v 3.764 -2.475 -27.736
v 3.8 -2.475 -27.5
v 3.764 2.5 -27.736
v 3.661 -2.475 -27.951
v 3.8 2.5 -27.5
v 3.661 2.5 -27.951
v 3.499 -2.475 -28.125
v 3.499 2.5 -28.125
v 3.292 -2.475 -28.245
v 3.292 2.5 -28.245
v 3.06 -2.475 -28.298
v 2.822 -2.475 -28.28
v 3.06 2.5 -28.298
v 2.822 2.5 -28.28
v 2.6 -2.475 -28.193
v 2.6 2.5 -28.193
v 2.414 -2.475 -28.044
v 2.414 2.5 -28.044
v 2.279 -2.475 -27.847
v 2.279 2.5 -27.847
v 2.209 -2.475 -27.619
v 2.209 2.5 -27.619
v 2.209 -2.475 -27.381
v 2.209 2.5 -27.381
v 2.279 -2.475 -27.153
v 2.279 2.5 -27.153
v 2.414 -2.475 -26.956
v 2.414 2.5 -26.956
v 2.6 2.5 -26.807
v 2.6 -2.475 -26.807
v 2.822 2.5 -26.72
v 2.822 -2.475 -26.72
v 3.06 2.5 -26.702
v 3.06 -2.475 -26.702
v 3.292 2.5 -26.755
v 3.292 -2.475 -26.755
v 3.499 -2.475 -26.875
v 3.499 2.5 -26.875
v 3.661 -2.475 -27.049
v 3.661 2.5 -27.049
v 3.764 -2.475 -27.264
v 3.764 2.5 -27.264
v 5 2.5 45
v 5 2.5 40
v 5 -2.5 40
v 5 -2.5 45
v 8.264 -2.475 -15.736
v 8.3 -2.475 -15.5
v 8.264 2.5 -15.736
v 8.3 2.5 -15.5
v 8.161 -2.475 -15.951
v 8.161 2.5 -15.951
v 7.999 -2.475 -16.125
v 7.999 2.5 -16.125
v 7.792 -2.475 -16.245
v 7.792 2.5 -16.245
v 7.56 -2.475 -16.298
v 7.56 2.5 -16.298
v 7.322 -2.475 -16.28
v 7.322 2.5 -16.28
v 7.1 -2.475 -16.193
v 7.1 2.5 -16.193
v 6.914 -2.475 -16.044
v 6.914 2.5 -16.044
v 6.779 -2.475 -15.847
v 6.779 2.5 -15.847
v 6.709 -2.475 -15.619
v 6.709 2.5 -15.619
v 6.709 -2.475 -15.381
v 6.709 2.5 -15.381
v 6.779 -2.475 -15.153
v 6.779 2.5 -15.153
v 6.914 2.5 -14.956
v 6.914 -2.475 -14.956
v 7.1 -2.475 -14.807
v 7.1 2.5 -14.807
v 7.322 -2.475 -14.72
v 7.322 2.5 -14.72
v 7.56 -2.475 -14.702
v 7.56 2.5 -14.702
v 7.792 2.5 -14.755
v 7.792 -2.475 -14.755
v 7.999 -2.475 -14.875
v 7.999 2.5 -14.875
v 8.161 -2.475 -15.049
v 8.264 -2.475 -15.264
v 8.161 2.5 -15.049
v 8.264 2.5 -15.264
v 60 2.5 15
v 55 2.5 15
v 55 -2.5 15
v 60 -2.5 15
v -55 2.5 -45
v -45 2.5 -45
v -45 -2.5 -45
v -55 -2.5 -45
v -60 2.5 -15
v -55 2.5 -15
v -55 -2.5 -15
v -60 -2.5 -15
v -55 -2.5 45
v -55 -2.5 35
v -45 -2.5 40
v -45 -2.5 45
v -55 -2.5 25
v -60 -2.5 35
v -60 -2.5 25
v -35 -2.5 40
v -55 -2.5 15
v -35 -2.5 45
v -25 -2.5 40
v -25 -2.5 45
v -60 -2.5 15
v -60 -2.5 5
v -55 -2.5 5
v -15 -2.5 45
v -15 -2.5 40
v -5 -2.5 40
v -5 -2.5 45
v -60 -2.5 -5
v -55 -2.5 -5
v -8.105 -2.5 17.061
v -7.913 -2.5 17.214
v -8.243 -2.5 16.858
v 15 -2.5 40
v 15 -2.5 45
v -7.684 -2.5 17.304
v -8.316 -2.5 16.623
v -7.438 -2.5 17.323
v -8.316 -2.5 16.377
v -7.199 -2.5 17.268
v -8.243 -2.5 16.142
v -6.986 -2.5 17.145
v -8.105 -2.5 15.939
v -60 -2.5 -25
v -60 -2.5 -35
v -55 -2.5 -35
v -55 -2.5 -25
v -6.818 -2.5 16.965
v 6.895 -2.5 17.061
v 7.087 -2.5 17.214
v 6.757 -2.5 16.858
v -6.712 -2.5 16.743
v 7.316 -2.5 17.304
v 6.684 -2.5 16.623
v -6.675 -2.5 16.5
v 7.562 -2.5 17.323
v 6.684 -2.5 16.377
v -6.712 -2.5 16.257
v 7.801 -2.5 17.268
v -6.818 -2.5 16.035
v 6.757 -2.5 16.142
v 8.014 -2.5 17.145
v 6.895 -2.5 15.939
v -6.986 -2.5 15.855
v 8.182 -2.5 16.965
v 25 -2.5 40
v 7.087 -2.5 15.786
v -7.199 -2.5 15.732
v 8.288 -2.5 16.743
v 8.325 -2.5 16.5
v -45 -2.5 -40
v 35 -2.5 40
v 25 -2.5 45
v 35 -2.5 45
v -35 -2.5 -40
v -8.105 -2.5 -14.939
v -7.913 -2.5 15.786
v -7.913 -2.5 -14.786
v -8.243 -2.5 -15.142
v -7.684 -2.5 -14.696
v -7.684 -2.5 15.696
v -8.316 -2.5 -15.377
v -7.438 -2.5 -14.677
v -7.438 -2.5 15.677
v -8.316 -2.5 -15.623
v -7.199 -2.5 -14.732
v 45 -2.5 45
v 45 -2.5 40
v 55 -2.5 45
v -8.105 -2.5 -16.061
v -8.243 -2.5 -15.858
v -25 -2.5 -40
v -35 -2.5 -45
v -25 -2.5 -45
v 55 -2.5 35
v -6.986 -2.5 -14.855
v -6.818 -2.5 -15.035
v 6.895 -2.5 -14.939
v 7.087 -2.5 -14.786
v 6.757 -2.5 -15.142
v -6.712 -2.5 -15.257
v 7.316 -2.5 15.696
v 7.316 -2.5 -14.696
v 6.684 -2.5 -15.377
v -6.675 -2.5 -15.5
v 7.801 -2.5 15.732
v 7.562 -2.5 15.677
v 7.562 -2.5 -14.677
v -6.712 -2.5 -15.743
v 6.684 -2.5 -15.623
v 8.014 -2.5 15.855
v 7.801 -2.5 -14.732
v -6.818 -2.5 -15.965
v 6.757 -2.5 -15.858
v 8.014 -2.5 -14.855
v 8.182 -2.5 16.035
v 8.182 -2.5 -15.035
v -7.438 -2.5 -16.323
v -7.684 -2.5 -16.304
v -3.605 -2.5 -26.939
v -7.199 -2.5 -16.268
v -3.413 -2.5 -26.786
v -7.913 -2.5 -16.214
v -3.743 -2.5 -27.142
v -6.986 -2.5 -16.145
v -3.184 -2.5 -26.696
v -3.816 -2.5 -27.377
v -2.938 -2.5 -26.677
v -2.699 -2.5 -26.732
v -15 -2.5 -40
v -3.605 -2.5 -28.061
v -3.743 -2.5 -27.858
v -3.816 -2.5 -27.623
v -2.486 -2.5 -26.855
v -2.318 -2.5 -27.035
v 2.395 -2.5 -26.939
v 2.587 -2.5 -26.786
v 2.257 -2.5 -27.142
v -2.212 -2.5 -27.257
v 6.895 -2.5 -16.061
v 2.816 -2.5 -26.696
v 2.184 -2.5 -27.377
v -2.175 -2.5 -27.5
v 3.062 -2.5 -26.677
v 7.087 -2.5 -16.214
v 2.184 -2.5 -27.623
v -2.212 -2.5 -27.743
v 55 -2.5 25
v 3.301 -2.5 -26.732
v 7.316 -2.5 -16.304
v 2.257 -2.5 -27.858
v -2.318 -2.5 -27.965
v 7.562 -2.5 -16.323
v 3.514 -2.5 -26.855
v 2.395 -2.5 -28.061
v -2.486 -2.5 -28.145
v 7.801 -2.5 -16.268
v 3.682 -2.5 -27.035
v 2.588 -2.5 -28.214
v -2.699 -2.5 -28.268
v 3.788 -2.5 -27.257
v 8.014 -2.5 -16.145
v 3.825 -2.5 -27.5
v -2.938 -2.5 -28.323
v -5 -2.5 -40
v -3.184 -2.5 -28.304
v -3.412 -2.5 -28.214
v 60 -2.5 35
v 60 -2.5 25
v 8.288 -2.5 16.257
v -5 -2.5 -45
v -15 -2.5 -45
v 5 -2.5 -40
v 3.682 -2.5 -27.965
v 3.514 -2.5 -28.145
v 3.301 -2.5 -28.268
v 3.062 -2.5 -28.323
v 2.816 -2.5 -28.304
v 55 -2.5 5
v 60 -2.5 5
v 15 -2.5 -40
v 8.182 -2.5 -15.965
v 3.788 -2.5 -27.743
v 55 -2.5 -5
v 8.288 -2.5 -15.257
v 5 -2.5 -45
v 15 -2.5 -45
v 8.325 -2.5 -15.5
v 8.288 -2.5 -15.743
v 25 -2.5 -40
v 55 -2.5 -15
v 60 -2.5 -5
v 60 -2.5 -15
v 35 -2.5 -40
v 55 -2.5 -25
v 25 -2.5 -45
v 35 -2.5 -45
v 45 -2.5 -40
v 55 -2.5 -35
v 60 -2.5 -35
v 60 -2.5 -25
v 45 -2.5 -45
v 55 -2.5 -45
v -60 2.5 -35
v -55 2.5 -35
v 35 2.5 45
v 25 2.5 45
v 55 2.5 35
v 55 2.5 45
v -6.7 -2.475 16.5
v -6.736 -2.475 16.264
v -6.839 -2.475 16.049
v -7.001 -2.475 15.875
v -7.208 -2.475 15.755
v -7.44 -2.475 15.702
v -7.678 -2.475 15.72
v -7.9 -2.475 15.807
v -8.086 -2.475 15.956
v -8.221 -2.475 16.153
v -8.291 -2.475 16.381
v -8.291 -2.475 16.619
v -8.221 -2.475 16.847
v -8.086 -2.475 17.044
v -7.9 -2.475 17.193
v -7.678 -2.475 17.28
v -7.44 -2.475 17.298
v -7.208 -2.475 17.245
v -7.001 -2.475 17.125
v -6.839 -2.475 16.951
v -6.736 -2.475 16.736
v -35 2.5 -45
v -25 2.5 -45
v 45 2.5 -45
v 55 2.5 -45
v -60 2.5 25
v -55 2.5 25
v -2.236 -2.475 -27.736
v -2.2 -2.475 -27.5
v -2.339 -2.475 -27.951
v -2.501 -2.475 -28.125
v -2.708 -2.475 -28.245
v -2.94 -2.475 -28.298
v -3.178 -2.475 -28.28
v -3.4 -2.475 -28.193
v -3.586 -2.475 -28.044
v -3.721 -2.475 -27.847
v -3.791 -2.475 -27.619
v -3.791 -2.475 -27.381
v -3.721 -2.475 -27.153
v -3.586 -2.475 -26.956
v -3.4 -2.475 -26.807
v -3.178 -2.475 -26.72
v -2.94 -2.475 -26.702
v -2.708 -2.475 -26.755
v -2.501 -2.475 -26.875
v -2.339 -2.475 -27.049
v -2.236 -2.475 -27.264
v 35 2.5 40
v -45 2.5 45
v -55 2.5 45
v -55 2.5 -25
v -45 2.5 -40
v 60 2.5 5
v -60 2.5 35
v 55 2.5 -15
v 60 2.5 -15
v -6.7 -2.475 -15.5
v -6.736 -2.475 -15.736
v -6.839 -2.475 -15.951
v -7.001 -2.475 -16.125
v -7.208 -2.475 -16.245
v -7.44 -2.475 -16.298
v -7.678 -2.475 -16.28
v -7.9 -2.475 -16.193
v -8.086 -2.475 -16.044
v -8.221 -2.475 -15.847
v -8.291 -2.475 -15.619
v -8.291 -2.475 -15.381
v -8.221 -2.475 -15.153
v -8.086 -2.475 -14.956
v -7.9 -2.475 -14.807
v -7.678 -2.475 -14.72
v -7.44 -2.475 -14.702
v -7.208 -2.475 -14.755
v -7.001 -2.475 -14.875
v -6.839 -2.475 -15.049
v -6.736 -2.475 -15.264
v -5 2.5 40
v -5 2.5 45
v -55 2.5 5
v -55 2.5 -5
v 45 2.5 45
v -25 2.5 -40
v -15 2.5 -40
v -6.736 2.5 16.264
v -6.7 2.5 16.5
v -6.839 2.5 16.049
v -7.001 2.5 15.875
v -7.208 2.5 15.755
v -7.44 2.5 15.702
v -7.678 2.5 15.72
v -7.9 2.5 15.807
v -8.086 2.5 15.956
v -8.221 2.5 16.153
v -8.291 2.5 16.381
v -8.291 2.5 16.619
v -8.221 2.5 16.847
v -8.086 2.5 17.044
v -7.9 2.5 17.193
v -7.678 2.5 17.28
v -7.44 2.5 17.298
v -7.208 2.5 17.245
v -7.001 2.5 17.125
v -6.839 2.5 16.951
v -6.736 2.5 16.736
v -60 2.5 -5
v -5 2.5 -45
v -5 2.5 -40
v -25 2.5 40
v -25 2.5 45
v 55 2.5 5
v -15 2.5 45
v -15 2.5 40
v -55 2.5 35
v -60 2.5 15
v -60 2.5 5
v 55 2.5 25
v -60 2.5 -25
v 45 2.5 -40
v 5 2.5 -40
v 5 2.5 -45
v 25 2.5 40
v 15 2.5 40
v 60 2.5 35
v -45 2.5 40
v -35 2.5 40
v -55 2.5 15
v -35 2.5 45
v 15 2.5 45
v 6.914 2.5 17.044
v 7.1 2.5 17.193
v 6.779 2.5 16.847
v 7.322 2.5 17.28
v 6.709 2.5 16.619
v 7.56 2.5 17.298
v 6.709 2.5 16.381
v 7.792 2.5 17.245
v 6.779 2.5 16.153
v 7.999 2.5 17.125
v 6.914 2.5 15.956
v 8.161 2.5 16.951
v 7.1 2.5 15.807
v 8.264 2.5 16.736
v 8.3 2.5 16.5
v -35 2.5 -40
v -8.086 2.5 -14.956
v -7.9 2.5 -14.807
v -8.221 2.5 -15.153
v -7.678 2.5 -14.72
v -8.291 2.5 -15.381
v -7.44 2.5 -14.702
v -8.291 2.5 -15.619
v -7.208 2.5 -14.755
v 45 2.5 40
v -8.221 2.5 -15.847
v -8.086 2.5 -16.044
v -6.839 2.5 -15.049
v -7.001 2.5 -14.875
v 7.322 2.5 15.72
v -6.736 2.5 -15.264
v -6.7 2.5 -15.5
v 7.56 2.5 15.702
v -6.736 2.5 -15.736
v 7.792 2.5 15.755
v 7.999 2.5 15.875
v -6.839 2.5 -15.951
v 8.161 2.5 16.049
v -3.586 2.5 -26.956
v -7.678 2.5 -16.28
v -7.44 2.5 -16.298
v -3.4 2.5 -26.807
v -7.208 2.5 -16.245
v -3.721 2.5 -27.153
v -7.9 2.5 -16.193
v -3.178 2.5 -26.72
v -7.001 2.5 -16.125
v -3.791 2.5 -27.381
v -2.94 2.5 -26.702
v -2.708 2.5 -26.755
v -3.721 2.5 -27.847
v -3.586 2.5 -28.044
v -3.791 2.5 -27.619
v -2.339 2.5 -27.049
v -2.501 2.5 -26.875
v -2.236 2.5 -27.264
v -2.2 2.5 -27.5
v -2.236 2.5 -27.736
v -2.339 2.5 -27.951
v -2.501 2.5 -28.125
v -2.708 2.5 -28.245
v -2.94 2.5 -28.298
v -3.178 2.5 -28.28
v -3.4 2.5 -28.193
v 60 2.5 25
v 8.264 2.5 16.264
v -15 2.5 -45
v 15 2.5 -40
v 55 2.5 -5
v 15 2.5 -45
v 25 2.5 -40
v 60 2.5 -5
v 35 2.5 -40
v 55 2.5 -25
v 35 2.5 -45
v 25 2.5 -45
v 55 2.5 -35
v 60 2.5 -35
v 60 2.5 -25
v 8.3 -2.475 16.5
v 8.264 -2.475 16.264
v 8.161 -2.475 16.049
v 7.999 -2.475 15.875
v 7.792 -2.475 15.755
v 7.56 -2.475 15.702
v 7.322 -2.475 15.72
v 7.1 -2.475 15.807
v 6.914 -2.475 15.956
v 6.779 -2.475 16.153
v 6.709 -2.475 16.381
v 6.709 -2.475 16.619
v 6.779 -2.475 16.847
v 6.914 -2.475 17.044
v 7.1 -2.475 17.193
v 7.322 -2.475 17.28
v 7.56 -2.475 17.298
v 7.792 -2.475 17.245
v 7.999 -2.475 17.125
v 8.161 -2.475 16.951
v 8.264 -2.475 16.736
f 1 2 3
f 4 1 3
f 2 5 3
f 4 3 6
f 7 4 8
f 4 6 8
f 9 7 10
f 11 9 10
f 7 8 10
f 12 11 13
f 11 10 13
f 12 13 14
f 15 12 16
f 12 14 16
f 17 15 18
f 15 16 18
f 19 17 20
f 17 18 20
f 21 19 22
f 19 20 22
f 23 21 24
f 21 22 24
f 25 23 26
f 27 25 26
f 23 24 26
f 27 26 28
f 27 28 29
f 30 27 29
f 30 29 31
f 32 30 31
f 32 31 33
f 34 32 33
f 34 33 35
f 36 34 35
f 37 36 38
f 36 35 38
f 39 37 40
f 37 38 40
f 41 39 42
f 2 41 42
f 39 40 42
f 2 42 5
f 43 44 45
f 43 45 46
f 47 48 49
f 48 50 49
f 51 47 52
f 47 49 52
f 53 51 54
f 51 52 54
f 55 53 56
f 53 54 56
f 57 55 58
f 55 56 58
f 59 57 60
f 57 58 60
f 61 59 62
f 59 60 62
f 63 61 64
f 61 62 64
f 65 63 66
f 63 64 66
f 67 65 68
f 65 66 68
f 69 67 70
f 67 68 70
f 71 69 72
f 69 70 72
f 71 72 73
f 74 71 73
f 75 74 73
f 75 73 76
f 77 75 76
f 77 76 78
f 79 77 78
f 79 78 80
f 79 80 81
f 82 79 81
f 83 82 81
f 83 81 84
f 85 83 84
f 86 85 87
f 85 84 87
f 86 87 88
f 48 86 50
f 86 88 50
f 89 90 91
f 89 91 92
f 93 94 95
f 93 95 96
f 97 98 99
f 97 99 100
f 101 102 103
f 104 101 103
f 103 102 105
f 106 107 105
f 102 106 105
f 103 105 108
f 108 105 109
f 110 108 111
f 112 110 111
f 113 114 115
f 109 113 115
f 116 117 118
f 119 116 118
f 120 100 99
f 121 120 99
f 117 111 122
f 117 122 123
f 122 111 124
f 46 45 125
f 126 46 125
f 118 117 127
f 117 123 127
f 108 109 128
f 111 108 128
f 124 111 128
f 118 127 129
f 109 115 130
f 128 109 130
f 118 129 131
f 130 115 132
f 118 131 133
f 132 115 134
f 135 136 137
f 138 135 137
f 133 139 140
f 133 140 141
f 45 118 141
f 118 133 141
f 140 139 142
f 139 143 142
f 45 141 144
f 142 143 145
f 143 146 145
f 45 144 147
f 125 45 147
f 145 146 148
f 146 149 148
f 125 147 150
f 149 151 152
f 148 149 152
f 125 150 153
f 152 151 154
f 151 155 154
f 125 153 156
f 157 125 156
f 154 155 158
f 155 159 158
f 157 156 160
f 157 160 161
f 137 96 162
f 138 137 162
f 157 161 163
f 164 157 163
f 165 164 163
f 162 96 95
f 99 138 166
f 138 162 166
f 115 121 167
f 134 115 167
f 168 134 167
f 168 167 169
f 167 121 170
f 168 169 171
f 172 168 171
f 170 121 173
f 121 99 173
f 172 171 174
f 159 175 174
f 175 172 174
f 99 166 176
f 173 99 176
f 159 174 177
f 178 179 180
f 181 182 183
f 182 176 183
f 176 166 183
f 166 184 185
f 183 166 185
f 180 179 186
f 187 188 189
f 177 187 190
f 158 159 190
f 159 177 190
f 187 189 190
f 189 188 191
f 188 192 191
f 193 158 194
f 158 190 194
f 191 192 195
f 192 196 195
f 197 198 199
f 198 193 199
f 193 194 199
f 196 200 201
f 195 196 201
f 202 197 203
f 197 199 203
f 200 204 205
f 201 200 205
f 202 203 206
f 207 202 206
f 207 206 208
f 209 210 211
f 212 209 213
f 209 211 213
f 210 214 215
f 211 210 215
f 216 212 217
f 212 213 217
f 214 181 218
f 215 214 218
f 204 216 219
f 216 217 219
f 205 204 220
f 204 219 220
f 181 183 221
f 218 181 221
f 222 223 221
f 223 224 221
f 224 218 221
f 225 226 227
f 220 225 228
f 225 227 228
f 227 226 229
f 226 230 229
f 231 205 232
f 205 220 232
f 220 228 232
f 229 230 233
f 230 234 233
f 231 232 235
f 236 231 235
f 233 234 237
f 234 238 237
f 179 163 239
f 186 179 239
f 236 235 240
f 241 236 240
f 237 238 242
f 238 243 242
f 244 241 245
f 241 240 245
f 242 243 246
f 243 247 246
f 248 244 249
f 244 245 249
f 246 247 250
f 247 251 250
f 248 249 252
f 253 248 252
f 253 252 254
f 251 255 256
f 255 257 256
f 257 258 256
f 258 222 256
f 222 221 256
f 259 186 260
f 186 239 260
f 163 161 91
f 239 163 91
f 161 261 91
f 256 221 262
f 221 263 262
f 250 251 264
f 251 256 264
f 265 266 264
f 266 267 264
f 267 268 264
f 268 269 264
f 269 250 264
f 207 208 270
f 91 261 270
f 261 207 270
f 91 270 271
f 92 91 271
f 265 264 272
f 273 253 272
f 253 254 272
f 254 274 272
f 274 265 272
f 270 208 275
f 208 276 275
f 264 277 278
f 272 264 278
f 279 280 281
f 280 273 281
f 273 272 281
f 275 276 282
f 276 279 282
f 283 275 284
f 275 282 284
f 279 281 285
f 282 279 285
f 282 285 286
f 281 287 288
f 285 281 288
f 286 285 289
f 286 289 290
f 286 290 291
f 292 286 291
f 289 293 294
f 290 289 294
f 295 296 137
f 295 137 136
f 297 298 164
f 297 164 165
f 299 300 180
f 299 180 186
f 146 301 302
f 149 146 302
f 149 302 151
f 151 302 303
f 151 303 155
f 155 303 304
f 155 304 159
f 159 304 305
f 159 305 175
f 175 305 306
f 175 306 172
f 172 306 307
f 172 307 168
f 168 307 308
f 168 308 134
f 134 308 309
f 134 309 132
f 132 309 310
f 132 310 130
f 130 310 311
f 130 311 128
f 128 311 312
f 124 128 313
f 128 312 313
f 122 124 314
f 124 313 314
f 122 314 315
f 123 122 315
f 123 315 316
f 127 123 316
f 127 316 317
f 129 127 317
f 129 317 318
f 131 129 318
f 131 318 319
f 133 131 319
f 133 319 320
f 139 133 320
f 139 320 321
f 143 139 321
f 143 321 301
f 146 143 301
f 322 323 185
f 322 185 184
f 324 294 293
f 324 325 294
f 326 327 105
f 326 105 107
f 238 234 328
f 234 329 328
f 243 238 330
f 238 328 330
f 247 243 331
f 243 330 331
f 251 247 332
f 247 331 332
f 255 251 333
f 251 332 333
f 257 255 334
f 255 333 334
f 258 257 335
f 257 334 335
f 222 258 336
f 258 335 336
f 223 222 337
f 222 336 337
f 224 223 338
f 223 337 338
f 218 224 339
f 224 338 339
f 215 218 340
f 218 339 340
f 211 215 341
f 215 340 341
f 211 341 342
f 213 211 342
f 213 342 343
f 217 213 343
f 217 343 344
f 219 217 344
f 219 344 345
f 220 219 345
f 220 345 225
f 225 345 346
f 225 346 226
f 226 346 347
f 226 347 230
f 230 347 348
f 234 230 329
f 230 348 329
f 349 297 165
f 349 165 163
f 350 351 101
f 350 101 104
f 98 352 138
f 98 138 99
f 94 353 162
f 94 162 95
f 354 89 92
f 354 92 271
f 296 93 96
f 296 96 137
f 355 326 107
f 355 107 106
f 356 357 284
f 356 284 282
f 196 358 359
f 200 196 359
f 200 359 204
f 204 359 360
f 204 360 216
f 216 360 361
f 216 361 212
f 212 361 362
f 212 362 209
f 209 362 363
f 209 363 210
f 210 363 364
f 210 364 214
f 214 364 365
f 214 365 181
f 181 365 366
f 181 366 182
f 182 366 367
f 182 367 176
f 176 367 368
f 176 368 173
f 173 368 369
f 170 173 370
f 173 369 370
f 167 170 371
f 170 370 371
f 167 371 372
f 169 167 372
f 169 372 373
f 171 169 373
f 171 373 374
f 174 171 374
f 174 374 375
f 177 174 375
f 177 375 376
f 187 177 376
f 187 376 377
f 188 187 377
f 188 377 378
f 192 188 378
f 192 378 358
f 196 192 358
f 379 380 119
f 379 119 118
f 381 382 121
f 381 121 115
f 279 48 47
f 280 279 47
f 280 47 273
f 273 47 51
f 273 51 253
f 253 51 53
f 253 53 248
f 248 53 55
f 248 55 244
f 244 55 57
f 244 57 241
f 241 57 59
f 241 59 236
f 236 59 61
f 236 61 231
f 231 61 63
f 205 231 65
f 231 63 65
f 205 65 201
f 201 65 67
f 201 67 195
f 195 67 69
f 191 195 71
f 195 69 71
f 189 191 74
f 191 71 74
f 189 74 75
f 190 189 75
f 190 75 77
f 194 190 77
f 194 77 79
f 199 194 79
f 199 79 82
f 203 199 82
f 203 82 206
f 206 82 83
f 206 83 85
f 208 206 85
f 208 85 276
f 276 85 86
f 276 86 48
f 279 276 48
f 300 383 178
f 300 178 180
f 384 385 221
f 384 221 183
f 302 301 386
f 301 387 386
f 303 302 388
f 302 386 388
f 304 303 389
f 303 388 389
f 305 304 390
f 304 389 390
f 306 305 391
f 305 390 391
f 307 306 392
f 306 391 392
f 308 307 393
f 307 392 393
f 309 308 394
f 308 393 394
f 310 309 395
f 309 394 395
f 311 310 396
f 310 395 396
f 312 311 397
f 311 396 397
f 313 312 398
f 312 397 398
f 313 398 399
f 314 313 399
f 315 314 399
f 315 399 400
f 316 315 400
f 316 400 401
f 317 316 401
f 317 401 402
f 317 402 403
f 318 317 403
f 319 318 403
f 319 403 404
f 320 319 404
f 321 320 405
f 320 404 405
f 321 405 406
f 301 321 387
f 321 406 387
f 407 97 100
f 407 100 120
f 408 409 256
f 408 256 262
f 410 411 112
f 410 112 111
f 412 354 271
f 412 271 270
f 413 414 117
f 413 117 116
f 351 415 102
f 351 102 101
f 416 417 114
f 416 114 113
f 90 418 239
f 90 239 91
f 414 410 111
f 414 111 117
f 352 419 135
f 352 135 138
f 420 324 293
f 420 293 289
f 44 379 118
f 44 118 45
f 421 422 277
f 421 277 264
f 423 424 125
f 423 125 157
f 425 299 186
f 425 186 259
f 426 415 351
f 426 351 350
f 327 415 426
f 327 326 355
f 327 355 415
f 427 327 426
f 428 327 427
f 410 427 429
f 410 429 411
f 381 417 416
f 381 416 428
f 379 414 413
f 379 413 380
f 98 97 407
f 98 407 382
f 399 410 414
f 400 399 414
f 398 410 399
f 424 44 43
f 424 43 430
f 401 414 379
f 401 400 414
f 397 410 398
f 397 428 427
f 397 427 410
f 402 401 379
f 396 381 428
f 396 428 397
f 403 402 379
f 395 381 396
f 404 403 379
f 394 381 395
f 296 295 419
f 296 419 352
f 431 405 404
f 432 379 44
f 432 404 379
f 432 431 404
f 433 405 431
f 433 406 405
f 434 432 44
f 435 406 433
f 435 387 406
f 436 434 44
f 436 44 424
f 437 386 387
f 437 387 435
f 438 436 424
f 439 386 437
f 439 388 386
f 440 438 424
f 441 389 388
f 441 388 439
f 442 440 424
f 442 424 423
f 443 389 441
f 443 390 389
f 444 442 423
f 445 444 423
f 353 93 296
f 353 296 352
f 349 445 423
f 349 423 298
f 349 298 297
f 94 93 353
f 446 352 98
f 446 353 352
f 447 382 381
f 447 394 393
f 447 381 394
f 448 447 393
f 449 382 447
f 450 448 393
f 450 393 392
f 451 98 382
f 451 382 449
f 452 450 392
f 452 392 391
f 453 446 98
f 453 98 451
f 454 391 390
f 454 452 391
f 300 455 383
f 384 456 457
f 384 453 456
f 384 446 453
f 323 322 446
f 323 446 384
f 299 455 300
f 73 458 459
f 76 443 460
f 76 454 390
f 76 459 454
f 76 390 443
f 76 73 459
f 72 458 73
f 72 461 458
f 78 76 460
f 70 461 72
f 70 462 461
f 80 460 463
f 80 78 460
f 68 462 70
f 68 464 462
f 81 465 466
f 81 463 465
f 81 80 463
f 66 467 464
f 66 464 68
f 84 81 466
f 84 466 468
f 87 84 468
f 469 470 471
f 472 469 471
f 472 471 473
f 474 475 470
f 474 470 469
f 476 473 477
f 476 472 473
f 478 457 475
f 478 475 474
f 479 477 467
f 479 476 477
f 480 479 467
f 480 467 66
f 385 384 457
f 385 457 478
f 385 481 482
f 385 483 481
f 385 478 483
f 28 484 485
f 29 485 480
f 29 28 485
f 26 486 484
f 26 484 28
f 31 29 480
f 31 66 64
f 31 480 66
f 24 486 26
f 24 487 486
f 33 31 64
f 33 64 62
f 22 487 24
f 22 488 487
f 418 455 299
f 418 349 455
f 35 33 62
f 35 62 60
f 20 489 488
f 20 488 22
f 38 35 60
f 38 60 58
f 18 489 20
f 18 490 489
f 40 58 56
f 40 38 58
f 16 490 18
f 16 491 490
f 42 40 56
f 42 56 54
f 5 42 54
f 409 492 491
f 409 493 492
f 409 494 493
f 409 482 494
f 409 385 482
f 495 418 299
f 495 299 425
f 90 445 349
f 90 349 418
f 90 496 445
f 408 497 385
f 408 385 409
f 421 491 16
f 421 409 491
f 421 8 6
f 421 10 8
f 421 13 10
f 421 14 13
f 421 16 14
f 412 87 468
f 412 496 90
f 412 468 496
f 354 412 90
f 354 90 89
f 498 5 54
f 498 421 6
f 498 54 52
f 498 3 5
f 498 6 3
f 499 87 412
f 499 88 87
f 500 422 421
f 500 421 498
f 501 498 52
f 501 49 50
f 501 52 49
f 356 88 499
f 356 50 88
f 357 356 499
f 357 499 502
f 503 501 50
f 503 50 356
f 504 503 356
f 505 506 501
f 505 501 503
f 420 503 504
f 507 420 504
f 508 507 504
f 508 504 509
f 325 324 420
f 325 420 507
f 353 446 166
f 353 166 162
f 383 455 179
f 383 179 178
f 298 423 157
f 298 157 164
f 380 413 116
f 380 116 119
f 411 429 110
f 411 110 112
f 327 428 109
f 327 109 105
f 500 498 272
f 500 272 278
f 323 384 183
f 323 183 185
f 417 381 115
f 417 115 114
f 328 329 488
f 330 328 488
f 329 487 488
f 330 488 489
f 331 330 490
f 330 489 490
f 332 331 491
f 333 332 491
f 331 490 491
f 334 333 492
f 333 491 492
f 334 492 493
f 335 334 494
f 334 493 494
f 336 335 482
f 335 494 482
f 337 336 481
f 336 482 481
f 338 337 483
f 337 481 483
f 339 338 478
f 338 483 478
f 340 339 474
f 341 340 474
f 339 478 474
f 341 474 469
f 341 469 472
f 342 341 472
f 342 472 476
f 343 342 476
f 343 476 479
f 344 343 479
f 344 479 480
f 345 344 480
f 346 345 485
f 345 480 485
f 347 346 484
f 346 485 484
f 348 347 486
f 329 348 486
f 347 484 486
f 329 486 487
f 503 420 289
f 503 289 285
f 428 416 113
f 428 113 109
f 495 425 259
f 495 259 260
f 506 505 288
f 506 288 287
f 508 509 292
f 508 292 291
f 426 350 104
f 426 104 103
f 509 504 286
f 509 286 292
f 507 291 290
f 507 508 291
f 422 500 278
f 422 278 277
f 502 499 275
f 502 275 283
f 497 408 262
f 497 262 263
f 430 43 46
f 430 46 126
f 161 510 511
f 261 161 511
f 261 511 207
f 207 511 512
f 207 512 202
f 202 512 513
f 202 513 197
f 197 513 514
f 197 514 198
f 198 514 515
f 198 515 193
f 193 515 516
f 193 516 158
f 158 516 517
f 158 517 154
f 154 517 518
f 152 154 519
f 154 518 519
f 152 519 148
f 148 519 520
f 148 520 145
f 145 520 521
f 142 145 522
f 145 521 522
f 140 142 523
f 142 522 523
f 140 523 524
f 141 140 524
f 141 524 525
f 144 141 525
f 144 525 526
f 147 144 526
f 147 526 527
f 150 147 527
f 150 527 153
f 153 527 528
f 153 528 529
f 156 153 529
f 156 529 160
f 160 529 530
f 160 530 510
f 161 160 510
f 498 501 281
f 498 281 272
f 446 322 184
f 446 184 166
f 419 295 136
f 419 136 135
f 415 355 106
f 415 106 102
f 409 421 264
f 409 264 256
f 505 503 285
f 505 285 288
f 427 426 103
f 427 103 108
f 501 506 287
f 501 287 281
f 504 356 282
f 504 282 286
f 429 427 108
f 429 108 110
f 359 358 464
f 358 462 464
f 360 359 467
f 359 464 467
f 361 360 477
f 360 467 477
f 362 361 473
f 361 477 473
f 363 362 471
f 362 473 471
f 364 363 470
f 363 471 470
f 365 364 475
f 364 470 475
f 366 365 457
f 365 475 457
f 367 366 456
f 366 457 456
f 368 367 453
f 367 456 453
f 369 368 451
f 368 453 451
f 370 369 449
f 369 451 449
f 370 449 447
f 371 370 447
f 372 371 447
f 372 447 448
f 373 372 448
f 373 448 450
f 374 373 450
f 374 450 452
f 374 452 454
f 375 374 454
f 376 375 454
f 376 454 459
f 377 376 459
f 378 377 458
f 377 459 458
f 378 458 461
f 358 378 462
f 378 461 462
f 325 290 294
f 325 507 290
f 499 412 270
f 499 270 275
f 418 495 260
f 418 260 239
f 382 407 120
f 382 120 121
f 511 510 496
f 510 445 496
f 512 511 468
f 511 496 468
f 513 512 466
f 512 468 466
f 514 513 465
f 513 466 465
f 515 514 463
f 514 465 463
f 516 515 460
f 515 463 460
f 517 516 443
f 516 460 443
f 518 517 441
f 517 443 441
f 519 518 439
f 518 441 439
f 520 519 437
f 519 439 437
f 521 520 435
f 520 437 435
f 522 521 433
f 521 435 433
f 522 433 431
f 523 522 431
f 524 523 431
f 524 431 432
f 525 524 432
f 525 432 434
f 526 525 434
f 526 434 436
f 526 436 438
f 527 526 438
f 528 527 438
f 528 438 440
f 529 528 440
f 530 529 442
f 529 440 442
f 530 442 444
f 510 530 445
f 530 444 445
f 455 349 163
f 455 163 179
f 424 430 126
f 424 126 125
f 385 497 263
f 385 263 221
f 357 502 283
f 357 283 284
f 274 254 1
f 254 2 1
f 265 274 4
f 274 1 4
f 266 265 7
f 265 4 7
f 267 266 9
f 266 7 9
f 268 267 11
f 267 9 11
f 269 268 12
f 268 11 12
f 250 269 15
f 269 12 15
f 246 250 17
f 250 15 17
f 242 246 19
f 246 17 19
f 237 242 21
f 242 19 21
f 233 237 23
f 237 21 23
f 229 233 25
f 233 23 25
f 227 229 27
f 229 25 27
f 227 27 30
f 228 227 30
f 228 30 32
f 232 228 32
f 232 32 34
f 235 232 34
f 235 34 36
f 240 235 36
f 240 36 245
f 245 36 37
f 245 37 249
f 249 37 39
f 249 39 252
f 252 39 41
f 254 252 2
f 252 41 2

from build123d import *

# Parameters (mm, degrees)
BOSS_EXTRUDE1_DEPTH               = 2.5
TAP_DRILL_FOR_M2_TAP2_D           = 1.6
TAP_DRILL_FOR_M2_TAP2_CSINK_D     = 1.65
TAP_DRILL_FOR_M2_TAP2_CSINK_ANGLE = 90


# Read off the part's stored shape, not the designer's step: Tap Drill for M2 Tap1
with BuildPart() as part:
    # Sketch1 → Boss-Extrude1 (new, symmetric)
    with BuildSketch(Plane(origin=(0, 0, 0), x_dir=(1, 0, 0), z_dir=(0, 1, 0))):
        Polygon((55, 45), (45, 45), (45, 40), (35, 40), (35, 45), (25, 45), (25, 40), (15, 40), (15, 45), (5, 45), (5, 40), (-5, 40), (-5, 45), (-15, 45), (-15, 40), (-25, 40), (-25, 45), (-35, 45), (-35, 40), (-45, 40), (-45, 45), (-55, 45), (-55, 40), (-55, 35), (-60, 35), (-60, 25), (-55, 25), (-55, 15), (-60, 15), (-60, 5), (-55, 5), (-55, -5), (-60, -5), (-60, -15), (-55, -15), (-55, -25), (-60, -25), (-60, -35), (-55, -35), (-55, -40), (-55, -45), (-45, -45), (-45, -40), (-35, -40), (-35, -45), (-25, -45), (-25, -40), (-15, -40), (-15, -45), (-5, -45), (-5, -40), (5, -40), (5, -45), (15, -45), (15, -40), (25, -40), (25, -45), (35, -45), (35, -40), (45, -40), (45, -45), (55, -45), (55, -40), (55, -35), (60, -35), (60, -25), (55, -25), (55, -15), (60, -15), (60, -5), (55, -5), (55, 5), (60, 5), (60, 15), (55, 15), (55, 25), (60, 25), (60, 35), (55, 35), (55, 40), align=None)
    extrude(amount=BOSS_EXTRUDE1_DEPTH, both=True)

    # Tap Drill for M2 Tap1 outline → Tap Drill for M2 Tap1 (revolve, cut)
    with BuildSketch(Plane(origin=(3, 0, -27.5), x_dir=(1, 0, 0), z_dir=(0, 0, 1))):
        Polygon((0.8, -2.475), (0.8, 2.5), (0, 2.5), (0, -2.5), (0.825, -2.5), align=None)
    revolve(axis=Axis((3, 0, -27.5), (0, 1, 0)), mode=Mode.SUBTRACT)

    # Tap Drill for M2 Tap1 2 outline → Tap Drill for M2 Tap1 2 (revolve, cut)
    with BuildSketch(Plane(origin=(-3, 0, -27.5), x_dir=(1, 0, 0), z_dir=(0, 0, 1))):
        Polygon((0.8, -2.475), (0.8, 2.5), (0, 2.5), (0, -2.5), (0.825, -2.5), align=None)
    revolve(axis=Axis((-3, 0, -27.5), (0, 1, 0)), mode=Mode.SUBTRACT)

    # Tap Drill for M2 Tap2 (through all)
    with Locations(Plane(origin=(0, -2.5, 0), x_dir=(-1, 0, 0), z_dir=(0, -1, 0))):
        with Locations((-7.5, 15.5), (7.5, 15.5), (-7.5, -16.5), (7.5, -16.5)):
            CounterSinkHole(TAP_DRILL_FOR_M2_TAP2_D / 2, TAP_DRILL_FOR_M2_TAP2_CSINK_D / 2, counter_sink_angle=TAP_DRILL_FOR_M2_TAP2_CSINK_ANGLE)


solid = part.part
